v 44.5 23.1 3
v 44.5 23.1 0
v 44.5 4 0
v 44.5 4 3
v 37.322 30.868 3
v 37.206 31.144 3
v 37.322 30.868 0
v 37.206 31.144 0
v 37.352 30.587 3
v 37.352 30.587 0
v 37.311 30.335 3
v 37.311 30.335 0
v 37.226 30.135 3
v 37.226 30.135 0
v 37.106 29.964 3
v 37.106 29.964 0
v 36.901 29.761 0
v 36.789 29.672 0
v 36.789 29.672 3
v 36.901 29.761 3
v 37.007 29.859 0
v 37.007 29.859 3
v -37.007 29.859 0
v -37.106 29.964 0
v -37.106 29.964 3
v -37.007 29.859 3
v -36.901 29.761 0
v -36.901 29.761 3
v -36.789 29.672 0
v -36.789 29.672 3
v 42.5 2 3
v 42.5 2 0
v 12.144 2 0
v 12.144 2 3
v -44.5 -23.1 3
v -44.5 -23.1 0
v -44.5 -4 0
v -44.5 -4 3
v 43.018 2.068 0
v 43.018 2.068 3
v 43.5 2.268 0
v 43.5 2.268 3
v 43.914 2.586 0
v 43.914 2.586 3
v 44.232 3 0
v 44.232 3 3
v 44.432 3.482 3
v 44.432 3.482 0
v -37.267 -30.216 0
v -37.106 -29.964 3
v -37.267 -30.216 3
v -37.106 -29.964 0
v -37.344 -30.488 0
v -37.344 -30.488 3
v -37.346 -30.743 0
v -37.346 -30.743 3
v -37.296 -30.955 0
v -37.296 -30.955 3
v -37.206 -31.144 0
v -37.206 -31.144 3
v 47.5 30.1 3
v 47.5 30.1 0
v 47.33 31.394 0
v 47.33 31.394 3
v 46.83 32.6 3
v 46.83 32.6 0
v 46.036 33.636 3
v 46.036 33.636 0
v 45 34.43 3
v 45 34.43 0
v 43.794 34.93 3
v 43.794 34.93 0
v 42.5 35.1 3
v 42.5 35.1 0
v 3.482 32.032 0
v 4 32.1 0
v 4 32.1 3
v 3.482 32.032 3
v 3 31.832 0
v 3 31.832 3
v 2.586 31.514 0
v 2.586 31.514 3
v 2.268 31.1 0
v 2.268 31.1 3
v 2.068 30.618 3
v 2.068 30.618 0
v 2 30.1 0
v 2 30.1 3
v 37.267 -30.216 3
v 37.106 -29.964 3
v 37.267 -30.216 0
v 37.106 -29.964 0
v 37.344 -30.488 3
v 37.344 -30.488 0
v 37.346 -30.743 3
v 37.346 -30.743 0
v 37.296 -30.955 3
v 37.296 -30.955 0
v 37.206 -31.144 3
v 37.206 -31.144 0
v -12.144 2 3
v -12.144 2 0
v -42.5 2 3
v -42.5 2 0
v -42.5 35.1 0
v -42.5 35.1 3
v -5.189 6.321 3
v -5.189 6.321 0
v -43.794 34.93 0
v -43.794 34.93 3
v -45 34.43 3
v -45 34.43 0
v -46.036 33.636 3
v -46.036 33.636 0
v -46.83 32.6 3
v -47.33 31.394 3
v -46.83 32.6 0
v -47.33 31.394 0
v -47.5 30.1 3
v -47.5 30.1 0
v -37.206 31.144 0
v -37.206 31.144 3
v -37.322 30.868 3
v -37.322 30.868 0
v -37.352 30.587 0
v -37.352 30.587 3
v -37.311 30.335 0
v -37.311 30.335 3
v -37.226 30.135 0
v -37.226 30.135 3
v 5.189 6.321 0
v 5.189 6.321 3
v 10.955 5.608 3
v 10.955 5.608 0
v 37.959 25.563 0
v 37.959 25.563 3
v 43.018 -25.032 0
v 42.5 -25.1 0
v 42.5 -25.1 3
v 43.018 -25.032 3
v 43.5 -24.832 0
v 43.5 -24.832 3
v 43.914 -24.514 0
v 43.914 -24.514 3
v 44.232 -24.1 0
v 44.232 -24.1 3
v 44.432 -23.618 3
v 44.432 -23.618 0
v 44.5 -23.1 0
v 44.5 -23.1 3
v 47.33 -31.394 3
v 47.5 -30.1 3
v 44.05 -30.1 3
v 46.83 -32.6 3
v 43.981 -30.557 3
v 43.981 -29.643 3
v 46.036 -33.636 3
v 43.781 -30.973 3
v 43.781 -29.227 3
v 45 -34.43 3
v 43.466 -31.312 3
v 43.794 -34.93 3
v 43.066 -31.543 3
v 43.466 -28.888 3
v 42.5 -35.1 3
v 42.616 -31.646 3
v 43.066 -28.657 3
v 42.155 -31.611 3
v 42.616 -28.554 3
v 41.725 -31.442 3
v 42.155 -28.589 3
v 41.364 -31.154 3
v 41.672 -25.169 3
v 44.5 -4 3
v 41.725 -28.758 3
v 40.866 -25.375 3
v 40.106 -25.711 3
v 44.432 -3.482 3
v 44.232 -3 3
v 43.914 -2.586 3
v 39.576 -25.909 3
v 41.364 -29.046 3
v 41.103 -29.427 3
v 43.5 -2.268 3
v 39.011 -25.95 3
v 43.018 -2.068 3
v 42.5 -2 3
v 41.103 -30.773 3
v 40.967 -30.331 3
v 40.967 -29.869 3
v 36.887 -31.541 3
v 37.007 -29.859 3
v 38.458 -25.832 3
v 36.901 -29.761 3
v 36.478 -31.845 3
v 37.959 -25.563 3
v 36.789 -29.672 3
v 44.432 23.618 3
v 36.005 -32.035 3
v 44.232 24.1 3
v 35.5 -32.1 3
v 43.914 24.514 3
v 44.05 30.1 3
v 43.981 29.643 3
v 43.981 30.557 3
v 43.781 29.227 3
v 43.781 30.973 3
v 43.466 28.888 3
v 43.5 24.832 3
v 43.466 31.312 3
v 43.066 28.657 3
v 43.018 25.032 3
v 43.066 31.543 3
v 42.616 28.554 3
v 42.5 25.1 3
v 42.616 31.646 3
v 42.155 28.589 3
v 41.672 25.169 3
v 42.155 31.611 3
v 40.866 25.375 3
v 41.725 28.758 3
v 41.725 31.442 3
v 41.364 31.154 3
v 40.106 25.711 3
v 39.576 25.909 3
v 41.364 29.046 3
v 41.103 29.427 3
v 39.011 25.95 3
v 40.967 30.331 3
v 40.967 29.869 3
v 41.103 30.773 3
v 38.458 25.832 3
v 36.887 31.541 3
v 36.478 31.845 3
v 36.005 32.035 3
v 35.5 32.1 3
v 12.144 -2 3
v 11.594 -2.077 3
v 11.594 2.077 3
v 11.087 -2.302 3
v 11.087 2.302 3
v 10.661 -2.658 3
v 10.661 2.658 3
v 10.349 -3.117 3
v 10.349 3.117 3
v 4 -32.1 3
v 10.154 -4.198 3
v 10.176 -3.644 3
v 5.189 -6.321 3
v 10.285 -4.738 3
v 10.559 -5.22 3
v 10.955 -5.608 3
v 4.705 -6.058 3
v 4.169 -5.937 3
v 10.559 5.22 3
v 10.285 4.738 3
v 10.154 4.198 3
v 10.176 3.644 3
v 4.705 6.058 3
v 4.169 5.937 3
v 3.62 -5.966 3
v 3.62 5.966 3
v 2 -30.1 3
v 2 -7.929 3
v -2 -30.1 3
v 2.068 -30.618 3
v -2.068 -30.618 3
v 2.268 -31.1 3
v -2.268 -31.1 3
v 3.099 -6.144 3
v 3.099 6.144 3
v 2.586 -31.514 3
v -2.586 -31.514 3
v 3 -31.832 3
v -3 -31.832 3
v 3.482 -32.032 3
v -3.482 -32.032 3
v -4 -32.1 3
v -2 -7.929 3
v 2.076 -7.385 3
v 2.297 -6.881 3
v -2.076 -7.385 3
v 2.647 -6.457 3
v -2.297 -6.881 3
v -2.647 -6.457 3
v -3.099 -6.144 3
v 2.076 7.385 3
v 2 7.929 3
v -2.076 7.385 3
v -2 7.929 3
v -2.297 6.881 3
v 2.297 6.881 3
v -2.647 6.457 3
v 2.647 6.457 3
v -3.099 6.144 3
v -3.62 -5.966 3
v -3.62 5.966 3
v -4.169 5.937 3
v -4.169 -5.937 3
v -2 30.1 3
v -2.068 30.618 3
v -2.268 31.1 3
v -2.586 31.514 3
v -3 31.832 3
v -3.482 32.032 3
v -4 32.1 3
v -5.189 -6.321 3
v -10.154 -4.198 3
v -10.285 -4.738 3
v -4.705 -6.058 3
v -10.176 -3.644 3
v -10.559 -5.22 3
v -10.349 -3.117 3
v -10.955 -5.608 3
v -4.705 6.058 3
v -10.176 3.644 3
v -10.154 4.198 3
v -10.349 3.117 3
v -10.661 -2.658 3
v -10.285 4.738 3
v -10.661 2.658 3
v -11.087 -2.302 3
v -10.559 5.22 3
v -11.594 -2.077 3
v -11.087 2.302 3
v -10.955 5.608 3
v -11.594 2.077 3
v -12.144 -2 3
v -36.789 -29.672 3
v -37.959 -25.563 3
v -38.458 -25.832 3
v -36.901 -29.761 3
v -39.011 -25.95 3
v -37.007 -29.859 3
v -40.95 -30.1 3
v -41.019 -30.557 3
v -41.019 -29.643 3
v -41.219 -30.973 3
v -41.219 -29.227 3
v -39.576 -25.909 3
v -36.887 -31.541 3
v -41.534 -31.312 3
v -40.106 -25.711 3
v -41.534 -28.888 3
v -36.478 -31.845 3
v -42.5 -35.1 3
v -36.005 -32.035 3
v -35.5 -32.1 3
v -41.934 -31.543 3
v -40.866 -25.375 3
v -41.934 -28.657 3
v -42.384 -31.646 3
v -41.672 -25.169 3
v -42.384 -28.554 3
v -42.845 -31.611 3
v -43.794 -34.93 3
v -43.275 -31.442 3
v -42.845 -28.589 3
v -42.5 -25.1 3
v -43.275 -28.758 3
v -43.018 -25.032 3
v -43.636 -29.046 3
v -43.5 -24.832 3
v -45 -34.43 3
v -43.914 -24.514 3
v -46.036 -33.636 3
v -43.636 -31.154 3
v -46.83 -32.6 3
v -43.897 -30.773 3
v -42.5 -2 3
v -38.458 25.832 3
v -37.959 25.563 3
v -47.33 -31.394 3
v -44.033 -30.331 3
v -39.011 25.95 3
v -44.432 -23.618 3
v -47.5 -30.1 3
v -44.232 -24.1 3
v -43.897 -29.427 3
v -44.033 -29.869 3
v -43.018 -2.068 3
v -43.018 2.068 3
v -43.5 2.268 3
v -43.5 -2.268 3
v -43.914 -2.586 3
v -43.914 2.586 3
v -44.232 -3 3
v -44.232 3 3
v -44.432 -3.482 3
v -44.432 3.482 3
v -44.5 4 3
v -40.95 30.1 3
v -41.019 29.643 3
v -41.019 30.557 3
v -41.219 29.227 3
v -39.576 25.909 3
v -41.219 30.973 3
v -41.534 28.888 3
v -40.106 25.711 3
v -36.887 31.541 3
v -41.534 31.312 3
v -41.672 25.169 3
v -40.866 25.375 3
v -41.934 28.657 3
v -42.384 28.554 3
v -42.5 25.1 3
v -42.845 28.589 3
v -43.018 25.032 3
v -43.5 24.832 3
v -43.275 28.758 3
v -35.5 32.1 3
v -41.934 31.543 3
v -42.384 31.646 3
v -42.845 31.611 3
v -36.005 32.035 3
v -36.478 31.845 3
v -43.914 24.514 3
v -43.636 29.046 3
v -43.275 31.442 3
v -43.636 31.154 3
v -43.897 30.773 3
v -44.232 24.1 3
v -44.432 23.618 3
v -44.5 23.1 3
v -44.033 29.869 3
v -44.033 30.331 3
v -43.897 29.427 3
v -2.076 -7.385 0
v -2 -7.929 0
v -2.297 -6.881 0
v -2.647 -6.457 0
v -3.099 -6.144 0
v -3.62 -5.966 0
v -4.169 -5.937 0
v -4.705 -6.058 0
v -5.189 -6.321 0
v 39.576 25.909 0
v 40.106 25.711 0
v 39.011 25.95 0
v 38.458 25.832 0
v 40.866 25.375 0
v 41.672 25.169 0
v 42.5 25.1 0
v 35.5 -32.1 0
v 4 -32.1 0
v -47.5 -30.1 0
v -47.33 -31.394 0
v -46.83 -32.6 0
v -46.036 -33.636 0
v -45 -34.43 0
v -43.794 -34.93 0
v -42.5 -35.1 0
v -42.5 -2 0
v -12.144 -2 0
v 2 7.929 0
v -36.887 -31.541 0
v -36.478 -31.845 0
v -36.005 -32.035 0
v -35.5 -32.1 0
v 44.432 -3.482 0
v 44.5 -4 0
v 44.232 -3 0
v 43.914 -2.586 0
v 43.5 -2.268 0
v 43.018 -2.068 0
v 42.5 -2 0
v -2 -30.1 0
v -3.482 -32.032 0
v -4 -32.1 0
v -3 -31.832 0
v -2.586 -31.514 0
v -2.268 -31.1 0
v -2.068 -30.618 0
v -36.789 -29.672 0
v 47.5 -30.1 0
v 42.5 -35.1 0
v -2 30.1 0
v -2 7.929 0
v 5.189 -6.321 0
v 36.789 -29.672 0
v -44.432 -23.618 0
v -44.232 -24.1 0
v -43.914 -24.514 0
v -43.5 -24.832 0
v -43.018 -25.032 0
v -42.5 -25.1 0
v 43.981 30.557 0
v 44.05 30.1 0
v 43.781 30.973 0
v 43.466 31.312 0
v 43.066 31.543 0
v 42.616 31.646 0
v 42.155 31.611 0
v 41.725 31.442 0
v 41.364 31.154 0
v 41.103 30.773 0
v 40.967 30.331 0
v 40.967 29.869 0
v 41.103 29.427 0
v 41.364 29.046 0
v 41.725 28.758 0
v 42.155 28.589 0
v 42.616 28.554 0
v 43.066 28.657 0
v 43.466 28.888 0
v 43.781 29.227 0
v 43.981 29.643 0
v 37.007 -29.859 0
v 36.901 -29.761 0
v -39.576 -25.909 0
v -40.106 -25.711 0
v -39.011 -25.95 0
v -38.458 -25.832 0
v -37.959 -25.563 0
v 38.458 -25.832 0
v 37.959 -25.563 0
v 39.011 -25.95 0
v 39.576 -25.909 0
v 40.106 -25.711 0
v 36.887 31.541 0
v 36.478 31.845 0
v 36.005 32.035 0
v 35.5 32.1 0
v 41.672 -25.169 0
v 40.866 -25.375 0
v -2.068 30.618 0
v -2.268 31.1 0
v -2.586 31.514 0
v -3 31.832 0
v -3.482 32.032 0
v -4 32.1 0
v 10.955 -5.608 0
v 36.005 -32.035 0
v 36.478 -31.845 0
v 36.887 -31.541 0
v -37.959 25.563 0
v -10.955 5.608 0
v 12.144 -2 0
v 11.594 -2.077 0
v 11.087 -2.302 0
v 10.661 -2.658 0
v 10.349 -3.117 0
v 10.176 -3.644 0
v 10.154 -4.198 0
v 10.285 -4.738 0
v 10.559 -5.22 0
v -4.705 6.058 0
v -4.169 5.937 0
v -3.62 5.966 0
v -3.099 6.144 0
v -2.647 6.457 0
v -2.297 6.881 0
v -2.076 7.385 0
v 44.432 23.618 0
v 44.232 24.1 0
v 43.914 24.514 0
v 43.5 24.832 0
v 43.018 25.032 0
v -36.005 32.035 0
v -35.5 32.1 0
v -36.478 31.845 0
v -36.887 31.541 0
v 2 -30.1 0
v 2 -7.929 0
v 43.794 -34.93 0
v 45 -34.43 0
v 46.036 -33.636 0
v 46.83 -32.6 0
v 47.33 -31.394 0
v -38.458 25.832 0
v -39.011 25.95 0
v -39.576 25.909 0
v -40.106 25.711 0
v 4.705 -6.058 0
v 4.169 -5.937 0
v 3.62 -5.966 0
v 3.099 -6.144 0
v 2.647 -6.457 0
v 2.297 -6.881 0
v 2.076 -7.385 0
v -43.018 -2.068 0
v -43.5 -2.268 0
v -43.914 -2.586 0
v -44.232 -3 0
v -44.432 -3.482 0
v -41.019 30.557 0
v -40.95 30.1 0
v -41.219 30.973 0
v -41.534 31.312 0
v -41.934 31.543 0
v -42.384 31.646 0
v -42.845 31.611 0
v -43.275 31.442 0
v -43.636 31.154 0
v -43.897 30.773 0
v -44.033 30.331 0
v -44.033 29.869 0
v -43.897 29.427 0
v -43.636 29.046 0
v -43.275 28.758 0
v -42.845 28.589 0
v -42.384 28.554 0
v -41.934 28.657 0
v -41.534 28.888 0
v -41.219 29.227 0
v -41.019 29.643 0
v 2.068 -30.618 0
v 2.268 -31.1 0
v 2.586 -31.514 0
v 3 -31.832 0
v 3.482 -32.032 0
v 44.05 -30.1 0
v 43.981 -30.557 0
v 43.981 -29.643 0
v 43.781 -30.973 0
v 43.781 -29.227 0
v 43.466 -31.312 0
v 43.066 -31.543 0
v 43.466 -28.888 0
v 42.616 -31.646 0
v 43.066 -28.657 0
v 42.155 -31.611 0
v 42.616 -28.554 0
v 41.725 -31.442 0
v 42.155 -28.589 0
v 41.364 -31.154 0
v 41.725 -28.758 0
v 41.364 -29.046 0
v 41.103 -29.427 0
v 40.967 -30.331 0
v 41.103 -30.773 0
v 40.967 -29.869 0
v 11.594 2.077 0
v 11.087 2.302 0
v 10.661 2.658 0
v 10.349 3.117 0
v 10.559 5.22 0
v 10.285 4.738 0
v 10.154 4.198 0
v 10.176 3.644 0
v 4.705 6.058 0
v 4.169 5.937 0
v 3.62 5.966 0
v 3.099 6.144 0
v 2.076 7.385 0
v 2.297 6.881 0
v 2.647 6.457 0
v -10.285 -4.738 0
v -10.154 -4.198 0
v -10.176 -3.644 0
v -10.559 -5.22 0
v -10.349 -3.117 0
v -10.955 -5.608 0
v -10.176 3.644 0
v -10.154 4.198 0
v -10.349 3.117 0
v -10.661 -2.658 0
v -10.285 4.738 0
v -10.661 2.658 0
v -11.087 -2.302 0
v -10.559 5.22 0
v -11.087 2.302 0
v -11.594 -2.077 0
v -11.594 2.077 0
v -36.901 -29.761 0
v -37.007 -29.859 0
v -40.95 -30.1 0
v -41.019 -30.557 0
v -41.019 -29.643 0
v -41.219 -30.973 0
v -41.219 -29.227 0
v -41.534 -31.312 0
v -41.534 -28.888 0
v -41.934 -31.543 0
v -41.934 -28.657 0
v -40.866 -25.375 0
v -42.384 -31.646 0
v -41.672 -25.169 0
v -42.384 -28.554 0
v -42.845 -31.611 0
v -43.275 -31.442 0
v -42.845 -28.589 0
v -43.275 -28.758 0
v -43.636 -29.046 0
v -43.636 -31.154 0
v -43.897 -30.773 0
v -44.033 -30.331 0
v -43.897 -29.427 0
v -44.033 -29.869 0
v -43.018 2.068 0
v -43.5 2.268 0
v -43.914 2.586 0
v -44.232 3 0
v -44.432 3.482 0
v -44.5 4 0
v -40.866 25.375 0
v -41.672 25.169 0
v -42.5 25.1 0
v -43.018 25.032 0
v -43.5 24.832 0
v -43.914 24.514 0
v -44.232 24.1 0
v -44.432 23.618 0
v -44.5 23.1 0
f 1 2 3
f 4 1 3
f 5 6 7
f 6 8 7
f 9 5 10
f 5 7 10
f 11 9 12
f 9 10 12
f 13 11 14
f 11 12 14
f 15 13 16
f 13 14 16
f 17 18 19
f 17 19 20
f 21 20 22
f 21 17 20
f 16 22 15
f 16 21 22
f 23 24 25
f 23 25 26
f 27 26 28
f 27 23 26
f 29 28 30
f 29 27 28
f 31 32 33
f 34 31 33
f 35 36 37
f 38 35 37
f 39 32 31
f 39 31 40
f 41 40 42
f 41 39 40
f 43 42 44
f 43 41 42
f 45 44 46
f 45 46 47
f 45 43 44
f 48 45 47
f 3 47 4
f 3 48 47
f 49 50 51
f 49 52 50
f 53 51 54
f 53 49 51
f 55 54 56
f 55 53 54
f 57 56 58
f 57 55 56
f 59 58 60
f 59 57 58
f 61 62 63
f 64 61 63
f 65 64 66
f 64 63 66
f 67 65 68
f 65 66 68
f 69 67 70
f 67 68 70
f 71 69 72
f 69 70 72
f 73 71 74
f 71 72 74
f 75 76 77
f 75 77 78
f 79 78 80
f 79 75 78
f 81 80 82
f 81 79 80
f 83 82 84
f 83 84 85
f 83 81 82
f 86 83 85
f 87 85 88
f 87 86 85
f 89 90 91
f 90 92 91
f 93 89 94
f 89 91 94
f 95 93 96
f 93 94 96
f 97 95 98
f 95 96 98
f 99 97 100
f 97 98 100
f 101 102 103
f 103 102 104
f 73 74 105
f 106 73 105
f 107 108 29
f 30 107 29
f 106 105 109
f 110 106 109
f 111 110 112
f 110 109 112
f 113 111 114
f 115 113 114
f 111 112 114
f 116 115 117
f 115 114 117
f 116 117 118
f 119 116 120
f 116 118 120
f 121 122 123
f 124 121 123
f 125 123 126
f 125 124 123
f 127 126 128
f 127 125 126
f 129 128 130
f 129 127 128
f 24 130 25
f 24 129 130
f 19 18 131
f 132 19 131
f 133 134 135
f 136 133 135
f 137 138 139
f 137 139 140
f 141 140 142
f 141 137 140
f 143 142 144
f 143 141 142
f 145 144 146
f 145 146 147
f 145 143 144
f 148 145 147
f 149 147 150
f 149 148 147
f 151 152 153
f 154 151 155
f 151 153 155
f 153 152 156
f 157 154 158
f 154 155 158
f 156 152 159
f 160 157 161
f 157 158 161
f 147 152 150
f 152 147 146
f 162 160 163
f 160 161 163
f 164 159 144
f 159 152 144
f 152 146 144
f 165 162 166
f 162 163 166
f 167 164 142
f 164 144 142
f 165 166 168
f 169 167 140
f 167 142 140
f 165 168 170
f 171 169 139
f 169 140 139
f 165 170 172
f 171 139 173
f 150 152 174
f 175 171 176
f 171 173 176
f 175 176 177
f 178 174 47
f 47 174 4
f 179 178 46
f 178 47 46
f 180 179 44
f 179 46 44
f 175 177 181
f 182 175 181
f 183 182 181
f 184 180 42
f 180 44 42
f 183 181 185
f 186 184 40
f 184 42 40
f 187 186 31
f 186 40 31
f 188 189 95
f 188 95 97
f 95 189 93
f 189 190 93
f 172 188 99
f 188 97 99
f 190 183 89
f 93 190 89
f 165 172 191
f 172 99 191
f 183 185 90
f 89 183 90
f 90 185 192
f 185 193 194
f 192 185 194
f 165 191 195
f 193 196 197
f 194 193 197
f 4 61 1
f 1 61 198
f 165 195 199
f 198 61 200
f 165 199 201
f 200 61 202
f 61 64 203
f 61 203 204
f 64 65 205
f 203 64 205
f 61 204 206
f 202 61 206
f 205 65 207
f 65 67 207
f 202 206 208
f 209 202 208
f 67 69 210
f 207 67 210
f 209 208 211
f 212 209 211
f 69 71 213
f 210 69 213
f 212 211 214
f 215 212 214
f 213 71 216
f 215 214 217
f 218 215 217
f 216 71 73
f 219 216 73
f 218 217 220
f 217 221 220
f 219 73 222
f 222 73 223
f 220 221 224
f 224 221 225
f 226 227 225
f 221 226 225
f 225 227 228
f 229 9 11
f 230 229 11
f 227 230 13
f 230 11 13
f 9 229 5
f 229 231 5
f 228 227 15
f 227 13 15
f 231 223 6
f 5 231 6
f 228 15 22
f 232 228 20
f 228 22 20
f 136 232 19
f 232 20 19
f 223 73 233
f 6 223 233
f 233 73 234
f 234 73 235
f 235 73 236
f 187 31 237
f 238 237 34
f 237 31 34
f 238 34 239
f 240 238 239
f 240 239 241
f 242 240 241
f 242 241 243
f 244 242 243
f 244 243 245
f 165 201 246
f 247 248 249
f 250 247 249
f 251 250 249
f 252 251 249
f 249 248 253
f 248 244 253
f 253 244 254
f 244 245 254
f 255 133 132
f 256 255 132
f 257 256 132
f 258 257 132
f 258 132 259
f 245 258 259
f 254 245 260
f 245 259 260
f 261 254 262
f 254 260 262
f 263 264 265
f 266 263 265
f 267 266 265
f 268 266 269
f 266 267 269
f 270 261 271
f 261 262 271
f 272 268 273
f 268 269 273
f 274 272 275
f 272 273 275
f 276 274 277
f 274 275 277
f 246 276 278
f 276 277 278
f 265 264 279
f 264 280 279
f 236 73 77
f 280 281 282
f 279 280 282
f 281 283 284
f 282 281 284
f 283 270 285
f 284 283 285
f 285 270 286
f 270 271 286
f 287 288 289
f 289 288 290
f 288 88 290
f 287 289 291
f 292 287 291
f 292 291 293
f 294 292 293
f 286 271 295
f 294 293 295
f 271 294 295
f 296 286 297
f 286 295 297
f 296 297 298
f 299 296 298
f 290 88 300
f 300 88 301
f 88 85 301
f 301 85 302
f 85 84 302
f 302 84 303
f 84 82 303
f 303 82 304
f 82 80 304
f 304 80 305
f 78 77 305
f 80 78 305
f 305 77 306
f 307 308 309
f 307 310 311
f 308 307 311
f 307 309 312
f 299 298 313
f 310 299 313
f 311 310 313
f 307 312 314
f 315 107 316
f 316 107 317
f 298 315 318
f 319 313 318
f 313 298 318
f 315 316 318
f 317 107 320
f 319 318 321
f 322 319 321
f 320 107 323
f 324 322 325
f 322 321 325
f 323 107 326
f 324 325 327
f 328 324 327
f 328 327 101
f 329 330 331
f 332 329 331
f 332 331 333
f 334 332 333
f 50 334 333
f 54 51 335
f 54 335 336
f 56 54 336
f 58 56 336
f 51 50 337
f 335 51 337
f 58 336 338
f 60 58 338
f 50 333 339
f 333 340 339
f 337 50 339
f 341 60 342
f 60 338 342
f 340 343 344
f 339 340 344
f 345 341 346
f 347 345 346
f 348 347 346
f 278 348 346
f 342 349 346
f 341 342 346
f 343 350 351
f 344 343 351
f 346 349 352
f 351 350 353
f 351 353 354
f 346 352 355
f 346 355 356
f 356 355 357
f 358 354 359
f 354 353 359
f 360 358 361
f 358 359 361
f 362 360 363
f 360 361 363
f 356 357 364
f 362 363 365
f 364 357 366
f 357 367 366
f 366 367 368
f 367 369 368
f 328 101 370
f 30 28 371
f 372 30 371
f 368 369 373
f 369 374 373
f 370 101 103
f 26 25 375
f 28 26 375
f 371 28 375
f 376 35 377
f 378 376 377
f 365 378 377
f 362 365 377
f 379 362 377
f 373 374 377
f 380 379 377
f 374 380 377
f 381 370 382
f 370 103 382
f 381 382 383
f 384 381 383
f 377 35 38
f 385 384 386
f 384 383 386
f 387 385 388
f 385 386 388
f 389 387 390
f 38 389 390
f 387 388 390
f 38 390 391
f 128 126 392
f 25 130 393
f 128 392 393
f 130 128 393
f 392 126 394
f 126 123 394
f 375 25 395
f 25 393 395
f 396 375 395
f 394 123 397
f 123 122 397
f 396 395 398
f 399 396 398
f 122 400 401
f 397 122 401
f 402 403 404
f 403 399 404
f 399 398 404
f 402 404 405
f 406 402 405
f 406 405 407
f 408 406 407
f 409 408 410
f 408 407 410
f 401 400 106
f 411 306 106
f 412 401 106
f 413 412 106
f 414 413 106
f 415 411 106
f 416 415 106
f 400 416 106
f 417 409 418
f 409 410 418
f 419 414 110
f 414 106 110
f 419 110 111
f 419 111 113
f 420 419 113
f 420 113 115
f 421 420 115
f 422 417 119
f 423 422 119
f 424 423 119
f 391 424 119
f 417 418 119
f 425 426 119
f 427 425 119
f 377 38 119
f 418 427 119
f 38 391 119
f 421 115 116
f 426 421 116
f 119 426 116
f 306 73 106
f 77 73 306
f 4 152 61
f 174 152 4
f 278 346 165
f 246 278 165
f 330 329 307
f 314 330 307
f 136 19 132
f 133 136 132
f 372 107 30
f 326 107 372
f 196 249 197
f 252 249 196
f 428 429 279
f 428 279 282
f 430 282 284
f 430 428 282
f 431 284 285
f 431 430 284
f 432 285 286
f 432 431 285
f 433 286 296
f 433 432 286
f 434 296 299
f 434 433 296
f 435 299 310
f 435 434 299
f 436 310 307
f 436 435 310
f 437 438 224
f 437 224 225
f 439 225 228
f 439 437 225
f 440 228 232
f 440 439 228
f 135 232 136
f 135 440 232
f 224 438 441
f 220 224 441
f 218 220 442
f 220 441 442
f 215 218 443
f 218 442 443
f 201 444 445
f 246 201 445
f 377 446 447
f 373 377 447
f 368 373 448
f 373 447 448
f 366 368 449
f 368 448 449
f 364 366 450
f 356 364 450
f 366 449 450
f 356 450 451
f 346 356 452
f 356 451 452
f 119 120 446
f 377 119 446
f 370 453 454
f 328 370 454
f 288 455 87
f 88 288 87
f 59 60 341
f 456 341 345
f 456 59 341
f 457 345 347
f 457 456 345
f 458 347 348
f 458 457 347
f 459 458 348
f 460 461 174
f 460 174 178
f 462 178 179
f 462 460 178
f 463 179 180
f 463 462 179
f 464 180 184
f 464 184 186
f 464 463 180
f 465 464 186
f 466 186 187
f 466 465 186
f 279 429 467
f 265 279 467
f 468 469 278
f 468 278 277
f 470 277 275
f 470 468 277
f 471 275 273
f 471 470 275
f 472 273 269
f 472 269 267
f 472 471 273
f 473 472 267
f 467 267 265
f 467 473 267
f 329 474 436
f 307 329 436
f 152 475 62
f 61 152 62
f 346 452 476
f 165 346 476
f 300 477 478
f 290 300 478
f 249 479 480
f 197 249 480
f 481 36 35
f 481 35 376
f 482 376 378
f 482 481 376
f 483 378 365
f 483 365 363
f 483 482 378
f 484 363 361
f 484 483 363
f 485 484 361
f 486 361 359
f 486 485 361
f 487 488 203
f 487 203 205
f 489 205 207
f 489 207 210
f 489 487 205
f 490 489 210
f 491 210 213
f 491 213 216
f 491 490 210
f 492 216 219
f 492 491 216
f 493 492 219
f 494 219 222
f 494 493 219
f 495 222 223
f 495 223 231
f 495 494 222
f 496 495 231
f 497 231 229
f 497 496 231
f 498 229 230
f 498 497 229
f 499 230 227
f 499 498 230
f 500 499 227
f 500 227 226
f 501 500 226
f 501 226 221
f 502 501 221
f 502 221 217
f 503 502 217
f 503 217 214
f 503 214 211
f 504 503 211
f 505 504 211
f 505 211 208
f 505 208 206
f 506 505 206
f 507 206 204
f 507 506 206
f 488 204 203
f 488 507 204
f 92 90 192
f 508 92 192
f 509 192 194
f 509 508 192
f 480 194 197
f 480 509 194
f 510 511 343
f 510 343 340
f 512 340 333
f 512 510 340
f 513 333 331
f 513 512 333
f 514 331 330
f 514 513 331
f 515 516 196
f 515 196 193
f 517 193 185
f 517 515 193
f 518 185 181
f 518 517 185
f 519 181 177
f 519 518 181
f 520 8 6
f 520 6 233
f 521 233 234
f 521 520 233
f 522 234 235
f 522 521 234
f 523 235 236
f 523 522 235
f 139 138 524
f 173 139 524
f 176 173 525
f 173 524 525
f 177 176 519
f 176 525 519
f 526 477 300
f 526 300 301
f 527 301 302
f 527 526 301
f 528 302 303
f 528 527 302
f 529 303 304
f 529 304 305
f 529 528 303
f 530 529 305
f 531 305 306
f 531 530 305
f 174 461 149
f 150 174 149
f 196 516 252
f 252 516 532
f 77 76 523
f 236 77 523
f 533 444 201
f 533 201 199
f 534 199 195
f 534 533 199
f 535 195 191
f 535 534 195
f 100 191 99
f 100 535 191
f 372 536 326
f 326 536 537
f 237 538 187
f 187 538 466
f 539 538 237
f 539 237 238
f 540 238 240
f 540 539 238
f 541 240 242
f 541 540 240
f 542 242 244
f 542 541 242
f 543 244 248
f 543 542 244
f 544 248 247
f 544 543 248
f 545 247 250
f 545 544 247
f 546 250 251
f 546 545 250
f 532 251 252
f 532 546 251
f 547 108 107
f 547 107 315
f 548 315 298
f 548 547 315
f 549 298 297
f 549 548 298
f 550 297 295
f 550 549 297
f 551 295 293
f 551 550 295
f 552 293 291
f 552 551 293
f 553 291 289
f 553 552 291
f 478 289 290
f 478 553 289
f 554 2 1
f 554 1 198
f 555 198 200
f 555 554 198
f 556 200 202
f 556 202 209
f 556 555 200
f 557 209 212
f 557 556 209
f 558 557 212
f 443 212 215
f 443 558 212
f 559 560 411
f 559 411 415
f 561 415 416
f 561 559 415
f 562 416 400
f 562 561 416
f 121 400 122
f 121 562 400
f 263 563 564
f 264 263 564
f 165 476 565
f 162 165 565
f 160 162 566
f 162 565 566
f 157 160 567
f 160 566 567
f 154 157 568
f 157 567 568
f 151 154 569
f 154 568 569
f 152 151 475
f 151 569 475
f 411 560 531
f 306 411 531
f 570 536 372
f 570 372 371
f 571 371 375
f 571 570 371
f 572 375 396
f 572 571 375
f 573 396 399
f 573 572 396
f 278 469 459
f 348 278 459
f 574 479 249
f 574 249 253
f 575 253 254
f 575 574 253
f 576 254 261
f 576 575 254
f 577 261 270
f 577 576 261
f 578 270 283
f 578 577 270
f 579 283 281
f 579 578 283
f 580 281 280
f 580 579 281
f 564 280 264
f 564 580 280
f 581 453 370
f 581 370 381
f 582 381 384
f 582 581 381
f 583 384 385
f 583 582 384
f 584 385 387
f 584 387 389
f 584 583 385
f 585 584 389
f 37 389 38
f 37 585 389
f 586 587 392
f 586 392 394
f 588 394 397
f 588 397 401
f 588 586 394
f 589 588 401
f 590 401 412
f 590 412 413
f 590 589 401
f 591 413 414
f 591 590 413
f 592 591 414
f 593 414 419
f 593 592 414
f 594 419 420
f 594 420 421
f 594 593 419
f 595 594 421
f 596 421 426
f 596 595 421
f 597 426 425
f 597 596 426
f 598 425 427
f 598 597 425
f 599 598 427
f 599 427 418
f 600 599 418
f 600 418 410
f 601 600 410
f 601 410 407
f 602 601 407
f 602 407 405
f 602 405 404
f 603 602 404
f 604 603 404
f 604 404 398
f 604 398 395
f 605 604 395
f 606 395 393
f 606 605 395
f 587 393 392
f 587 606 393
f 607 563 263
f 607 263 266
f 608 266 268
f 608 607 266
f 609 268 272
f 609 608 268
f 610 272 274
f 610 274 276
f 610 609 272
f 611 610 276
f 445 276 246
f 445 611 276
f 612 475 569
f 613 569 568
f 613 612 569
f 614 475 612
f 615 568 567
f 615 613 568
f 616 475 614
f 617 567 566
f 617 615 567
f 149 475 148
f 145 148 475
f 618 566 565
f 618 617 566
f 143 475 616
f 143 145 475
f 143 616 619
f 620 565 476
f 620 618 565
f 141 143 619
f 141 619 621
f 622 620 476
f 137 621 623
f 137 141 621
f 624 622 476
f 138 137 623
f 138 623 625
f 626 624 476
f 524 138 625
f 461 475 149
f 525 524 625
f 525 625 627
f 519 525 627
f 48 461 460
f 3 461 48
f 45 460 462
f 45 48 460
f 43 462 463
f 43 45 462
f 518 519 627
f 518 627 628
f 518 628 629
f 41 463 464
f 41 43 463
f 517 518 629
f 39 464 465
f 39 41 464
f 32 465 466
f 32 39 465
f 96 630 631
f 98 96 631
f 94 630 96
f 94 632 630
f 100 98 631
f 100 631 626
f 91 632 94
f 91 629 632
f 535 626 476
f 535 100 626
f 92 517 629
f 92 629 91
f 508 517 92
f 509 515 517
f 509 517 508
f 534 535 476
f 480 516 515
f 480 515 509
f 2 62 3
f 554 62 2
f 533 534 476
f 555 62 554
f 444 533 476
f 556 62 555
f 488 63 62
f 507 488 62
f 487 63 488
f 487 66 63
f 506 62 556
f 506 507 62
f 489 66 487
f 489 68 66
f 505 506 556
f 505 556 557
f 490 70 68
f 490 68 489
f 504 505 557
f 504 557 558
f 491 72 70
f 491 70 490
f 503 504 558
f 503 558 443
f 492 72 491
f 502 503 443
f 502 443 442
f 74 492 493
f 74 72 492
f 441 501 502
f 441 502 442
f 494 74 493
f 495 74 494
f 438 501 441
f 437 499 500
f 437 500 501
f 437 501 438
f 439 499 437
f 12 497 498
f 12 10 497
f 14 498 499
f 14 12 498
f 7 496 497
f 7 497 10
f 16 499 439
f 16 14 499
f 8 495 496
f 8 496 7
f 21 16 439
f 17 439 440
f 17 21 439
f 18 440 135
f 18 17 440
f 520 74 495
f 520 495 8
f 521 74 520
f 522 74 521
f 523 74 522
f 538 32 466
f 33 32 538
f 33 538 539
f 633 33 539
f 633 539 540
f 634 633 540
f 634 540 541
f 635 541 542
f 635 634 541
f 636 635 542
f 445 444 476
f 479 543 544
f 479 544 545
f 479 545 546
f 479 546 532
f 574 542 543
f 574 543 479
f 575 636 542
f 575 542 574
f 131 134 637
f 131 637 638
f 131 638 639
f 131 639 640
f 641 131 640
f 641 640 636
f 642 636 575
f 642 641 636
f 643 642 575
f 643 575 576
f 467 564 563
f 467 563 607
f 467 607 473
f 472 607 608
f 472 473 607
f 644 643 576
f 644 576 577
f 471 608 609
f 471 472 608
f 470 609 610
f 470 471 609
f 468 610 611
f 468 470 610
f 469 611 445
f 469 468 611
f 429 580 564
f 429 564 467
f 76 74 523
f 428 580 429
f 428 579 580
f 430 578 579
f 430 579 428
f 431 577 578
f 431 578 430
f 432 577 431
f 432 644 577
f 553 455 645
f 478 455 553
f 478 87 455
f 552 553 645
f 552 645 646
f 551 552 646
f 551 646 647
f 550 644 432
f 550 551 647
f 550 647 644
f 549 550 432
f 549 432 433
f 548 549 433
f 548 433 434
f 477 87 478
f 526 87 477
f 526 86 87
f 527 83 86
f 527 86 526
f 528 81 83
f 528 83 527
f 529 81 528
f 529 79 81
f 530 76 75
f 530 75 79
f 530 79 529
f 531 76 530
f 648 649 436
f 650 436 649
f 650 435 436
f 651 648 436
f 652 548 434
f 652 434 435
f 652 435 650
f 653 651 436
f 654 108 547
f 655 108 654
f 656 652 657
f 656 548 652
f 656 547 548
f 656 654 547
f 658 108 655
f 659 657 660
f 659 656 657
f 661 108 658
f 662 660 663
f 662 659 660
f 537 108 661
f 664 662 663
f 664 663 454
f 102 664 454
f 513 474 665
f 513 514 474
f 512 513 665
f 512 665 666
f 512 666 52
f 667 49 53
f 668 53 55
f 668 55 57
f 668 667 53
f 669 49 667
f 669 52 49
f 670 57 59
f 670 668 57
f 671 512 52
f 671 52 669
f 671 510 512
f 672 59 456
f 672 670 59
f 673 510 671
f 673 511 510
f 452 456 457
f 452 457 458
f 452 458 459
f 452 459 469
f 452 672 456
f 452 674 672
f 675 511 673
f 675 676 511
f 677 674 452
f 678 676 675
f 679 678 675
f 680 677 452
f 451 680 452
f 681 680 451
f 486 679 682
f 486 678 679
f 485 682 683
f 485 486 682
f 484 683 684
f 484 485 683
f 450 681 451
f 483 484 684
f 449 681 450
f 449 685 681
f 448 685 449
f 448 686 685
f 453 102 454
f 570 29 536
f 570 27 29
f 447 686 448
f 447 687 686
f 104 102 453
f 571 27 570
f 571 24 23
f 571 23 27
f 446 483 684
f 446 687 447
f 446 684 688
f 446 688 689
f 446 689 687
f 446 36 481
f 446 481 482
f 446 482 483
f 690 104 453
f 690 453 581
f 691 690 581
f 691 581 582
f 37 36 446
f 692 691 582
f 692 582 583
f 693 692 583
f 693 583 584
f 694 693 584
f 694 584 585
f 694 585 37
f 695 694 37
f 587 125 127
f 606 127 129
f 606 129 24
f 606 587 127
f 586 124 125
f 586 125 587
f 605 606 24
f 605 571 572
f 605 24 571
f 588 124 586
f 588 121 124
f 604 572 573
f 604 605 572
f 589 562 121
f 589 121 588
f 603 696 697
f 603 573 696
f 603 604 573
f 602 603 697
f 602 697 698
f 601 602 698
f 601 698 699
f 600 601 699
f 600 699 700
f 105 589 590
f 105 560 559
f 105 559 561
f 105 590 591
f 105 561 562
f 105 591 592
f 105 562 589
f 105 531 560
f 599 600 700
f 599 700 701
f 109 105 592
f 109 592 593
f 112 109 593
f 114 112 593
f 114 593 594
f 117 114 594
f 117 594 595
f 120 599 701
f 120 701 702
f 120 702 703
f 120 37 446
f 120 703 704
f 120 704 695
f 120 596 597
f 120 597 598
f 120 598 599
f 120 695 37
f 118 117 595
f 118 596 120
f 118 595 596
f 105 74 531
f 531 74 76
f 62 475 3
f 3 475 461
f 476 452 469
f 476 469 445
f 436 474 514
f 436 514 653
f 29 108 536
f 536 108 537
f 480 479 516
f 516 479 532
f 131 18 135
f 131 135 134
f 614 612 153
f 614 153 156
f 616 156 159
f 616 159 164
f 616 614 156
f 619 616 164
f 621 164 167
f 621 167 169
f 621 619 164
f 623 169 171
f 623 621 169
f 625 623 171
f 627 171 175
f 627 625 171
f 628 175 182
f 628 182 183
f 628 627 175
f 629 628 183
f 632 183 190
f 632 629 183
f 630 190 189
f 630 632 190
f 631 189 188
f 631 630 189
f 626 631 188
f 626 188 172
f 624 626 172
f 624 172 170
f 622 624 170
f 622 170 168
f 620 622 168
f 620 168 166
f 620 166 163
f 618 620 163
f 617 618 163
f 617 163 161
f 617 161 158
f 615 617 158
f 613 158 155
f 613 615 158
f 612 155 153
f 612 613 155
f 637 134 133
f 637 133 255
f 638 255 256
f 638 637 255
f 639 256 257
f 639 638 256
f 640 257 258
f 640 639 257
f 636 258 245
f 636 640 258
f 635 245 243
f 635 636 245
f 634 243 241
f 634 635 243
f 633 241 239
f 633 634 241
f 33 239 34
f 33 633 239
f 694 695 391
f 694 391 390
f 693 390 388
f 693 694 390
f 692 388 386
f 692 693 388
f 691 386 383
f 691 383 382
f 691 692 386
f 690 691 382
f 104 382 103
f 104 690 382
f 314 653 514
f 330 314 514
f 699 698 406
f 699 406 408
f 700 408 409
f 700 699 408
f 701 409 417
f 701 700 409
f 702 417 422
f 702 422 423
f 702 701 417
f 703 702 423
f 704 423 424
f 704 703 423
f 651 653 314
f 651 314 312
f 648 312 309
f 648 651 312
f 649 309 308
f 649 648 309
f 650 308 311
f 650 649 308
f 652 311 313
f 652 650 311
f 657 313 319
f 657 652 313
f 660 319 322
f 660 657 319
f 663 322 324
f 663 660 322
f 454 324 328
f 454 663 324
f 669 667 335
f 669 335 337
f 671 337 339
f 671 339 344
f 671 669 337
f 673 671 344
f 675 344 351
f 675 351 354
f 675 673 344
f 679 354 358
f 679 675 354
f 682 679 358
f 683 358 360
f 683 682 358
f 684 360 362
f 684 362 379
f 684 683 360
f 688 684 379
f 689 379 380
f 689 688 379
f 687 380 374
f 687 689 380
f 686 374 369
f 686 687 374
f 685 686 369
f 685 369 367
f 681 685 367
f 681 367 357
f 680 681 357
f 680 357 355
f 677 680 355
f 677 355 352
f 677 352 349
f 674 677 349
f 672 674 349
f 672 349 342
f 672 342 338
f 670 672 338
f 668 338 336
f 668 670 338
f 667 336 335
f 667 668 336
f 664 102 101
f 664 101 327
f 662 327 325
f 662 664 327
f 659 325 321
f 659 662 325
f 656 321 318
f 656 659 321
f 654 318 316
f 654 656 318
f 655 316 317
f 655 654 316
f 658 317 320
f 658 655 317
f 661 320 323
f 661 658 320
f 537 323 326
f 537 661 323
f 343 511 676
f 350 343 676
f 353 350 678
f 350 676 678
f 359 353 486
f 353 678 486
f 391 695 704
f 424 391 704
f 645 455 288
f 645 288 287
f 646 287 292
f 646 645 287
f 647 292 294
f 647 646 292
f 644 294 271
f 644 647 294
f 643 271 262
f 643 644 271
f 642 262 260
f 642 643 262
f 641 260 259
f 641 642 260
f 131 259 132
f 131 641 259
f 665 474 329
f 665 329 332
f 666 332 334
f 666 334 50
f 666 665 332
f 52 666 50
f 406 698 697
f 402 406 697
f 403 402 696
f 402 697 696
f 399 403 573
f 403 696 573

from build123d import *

# Parameters (mm, degrees)
SKETCH_1_R      = 5
SKETCH_1_R_2    = 1.55
EXTRUDE_1_DEPTH = 3
FILLET_1_R      = 2
FILLET_2_R      = 1


with BuildPart() as part:
    # 草图1 → 凸台-拉伸1 (new body)
    # profile 1 of 5: a face of its own
    with BuildSketch(Plane.XY):
        with BuildLine():
            Line((-42.5, -35.1), (42.5, -35.1))
            ThreePointArc((42.5, -35.1), (39.761387212, -34.283300133), (37.917424305, -32.1))
            Line((37.917424305, -32.1), (2, -32.1))
            Line((2, -32.1), (2, -3.964694458))
            Line((2, -3.964694458), (37.500961204, -30.198036316))
            ThreePointArc((37.500961204, -30.198036316), (37.902514018, -28.134517198), (39.116783888, -26.418444794))
            Line((39.116783888, -26.418444794), (6.071879965, -2))
            Line((6.071879965, -2), (44.5, -2))
            Line((44.5, -2), (44.5, -25.517424305))
            ThreePointArc((44.5, -25.517424305), (46.683300133, -27.361387212), (47.5, -30.1))
            Line((47.5, -30.1), (47.5, 30.1))
            ThreePointArc((47.5, 30.1), (46.683300133, 27.361387212), (44.5, 25.517424305))
            Line((44.5, 25.517424305), (44.5, 2))
            Line((44.5, 2), (6.071879965, 2))
            Line((6.071879965, 2), (39.116783888, 26.418444794))
            ThreePointArc((39.116783888, 26.418444794), (37.902514018, 28.134517198), (37.500961204, 30.198036316))
            Line((37.500961204, 30.198036316), (2, 3.964694458))
            Line((2, 3.964694458), (2, 32.1))
            Line((2, 32.1), (37.917424305, 32.1))
            ThreePointArc((37.917424305, 32.1), (39.761387212, 34.283300133), (42.5, 35.1))
            Line((42.5, 35.1), (-42.5, 35.1))
            ThreePointArc((-42.5, 35.1), (-39.761387212, 34.283300133), (-37.917424305, 32.1))
            Line((-37.917424305, 32.1), (-2, 32.1))
            Line((-2, 32.1), (-2, 3.964694458))
            Line((-2, 3.964694458), (-37.500961204, 30.198036316))
            ThreePointArc((-37.500961204, 30.198036316), (-37.500240307, 30.149020514), (-37.5, 30.1))
            ThreePointArc((-37.5, 30.1), (-37.922004775, 28.089537437), (-39.116783888, 26.418444794))
            Line((-39.116783888, 26.418444794), (-6.071879965, 2))
            Line((-6.071879965, 2), (-44.5, 2))
            Line((-44.5, 2), (-44.5, 25.517424305))
            ThreePointArc((-44.5, 25.517424305), (-46.683300133, 27.361387212), (-47.5, 30.1))
            Line((-47.5, 30.1), (-47.5, -30.1))
            ThreePointArc((-47.5, -30.1), (-46.683300133, -27.361387212), (-44.5, -25.517424305))
            Line((-44.5, -25.517424305), (-44.5, -2))
            Line((-44.5, -2), (-6.071879965, -2))
            Line((-6.071879965, -2), (-39.116783888, -26.418444794))
            ThreePointArc((-39.116783888, -26.418444794), (-37.922004775, -28.089537437), (-37.5, -30.1))
            ThreePointArc((-37.5, -30.1), (-37.500240307, -30.149020514), (-37.500961204, -30.198036316))
            Line((-37.500961204, -30.198036316), (-2, -3.964694458))
            Line((-2, -3.964694458), (-2, -32.1))
            Line((-2, -32.1), (-37.917424305, -32.1))
            ThreePointArc((-37.917424305, -32.1), (-39.761387212, -34.283300133), (-42.5, -35.1))
        make_face()
    # profile 2 of 5: a face of its own
    with BuildSketch(Plane.XY):
        with Locations((-42.5, 30.1)):
            Circle(SKETCH_1_R)
        with Locations((-42.5, 30.1)):
            Circle(SKETCH_1_R_2, mode=Mode.SUBTRACT)
    # profile 3 of 5: a face of its own
    with BuildSketch(Plane.XY):
        with Locations((42.5, 30.1)):
            Circle(SKETCH_1_R)
        with Locations((42.5, 30.1)):
            Circle(SKETCH_1_R_2, mode=Mode.SUBTRACT)
    # profile 4 of 5: a face of its own
    with BuildSketch(Plane.XY):
        with Locations((42.5, -30.1)):
            Circle(SKETCH_1_R)
        with Locations((42.5, -30.1)):
            Circle(SKETCH_1_R_2, mode=Mode.SUBTRACT)
    # profile 5 of 5: a face of its own
    with BuildSketch(Plane.XY):
        with Locations((-42.5, -30.1)):
            Circle(SKETCH_1_R)
        with Locations((-42.5, -30.1)):
            Circle(SKETCH_1_R_2, mode=Mode.SUBTRACT)
    extrude(amount=EXTRUDE_1_DEPTH)

    # 圆角1
    # the kernel refuses this fillet: 2 mm, written as the material it adds along each edge
    with BuildSketch(Plane(origin=(39.116783888, 26.418444794, 0), x_dir=(-0.8042465112804378, -0.5942958430724927, 0), z_dir=(0, 0, 1)), Plane(origin=(-39.116783888, -26.418444794, 0), x_dir=(0.8042465112804382, 0.5942958430724918, 0), z_dir=(0, 0, 1))) as fillet_1_piece_1:
        with BuildLine():
            CenterArc((1.439043849, 2), FILLET_1_R, 204.927038376, 65.072961624)
            ThreePointArc((-0.374646596, 1.157072383), (-0.152011037, 0.589969891), (0, 0))
            Line((0, 0), (1.439043849, 0))
        make_face()
    extrude(amount=3)
    with BuildSketch(Plane(origin=(6.071879965, 2, 0), x_dir=(1, 0, 0), z_dir=(0, 0, 1)), Plane(origin=(6.071879965, -2, 0), x_dir=(0.804246511280438, -0.5942958430724921, 0), z_dir=(0, 0, 1)), Plane(origin=(-6.071879965, -2, 0), x_dir=(-1, 0, 0), z_dir=(0, 0, 1)), Plane(origin=(-6.071879965, 2, 0), x_dir=(-0.8042465112804379, 0.5942958430724924, 0), z_dir=(0, 0, 1))) as fillet_1_piece_2:
        with BuildLine():
            CenterArc((FILLET_1_R * 3.03593998227, FILLET_1_R), FILLET_1_R, 126.462450613, 143.537549387)
            Line((FILLET_1_R * 2.4416441392, FILLET_1_R * 1.80424651128), (0, 0))
            Line((0, 0), (FILLET_1_R * 3.03593998227, 0))
        make_face()
    extrude(amount=3)
    with BuildSketch(Plane(origin=(44.5, 2, 0), x_dir=(0, 1, 0), z_dir=(0, 0, 1)), Plane(origin=(44.5, -2, 0), x_dir=(-1, 0, 0), z_dir=(0, 0, 1)), Plane(origin=(2, -32.1, 0), x_dir=(1, 0, 0), z_dir=(0, 0, 1)), Plane(origin=(-2, -32.1, 0), x_dir=(0, 1, 0), z_dir=(0, 0, 1)), Plane(origin=(-44.5, -2, 0), x_dir=(0, -1, 0), z_dir=(0, 0, 1)), Plane(origin=(-44.5, 2, 0), x_dir=(1, 0, 0), z_dir=(0, 0, 1)), Plane(origin=(-2, 32.1, 0), x_dir=(-1, 0, 0), z_dir=(0, 0, 1)), Plane(origin=(2, 32.1, 0), x_dir=(0, -1, 0), z_dir=(0, 0, 1))) as fillet_1_piece_3:
        with BuildLine():
            CenterArc((FILLET_1_R, FILLET_1_R), FILLET_1_R, 180, 90)
            Line((0, FILLET_1_R), (0, 0))
            Line((0, 0), (FILLET_1_R, 0))
        make_face()
    extrude(amount=3)
    with BuildSketch(Plane(origin=(44.5, 25.517424305, 0), x_dir=(0, -1, 0), z_dir=(0, 0, 1)), Plane(origin=(37.917424305, -32.1, 0), x_dir=(-1, 0, 0), z_dir=(0, 0, 1)), Plane(origin=(-44.5, -25.517424305, 0), x_dir=(0, 1, 0), z_dir=(0, 0, 1)), Plane(origin=(-37.917424305, 32.1, 0), x_dir=(1, 0, 0), z_dir=(0, 0, 1))) as fillet_1_piece_4:
        with BuildLine():
            CenterArc((2.417424305, -2), FILLET_1_R, 90, 90)
            ThreePointArc((0.417424305, -2), (0.31195587, -0.978451782), (0, 0))
            Line((0, 0), (2.417424305, 0))
        make_face()
    extrude(amount=3)
    with BuildSketch(Plane(origin=(44.5, -25.517424305, 0), x_dir=(0, 1, 0), z_dir=(0, 0, 1)), Plane(origin=(-37.917424305, -32.1, 0), x_dir=(1, 0, 0), z_dir=(0, 0, 1)), Plane(origin=(-44.5, 25.517424305, 0), x_dir=(0, -1, 0), z_dir=(0, 0, 1)), Plane(origin=(37.917424305, 32.1, 0), x_dir=(-1, 0, 0), z_dir=(0, 0, 1))) as fillet_1_piece_5:
        with BuildLine():
            CenterArc((2.417424305, 2), FILLET_1_R, 180, 90)
            ThreePointArc((0.417424305, 2), (0.31195587, 0.978451782), (0, 0))
            Line((0, 0), (2.417424305, 0))
        make_face()
    extrude(amount=3)
    with BuildSketch(Plane(origin=(39.116783888, -26.418444794, 0), x_dir=(-0.8042465112804377, 0.5942958430724928, 0), z_dir=(0, 0, 1)), Plane(origin=(-39.116783888, 26.418444794, 0), x_dir=(0.8042465112804396, -0.5942958430724902, 0), z_dir=(0, 0, 1))) as fillet_1_piece_6:
        with BuildLine():
            CenterArc((1.439043849, -2), FILLET_1_R, 90, 65.072961624)
            ThreePointArc((-0.374646596, -1.157072383), (-0.152011037, -0.589969891), (0, 0))
            Line((0, 0), (1.439043849, 0))
        make_face()
    extrude(amount=3)
    with BuildSketch(Plane(origin=(2, -3.964694458, 0), x_dir=(0, -1, 0), z_dir=(0, 0, 1)), Plane(origin=(-2, -3.964694458, 0), x_dir=(-0.8042465112804379, -0.5942958430724925, 0), z_dir=(0, 0, 1)), Plane(origin=(-2, 3.964694458, 0), x_dir=(0, 1, 0), z_dir=(0, 0, 1)), Plane(origin=(2, 3.964694458, 0), x_dir=(0.804246511280438, 0.5942958430724923, 0), z_dir=(0, 0, 1))) as fillet_1_piece_7:
        with BuildLine():
            CenterArc((FILLET_1_R * 1.982347229, FILLET_1_R), FILLET_1_R, 143.537549387, 126.462450613)
            Line((FILLET_1_R * 1.17810071772, FILLET_1_R * 1.59429584307), (0, 0))
            Line((0, 0), (FILLET_1_R * 1.982347229, 0))
        make_face()
    extrude(amount=3)
    with BuildSketch(Plane(origin=(37.500961204, -30.198036316, 0), x_dir=(-0.8042465112804396, 0.5942958430724902, 0), z_dir=(0, 0, 1)), Plane(origin=(-37.500961204, 30.198036316, 0), x_dir=(0.8042465112804383, -0.5942958430724916, 0), z_dir=(0, 0, 1))) as fillet_1_piece_8:
        with BuildLine():
            CenterArc((0.885482013, 2), FILLET_1_R, 226.169636842, 43.830363158)
            ThreePointArc((-0.499569115, 0.557213331), (-0.239344892, 0.287966338), (0, 0))
            Line((0, 0), (0.885482013, 0))
        make_face()
    extrude(amount=3)
    with BuildSketch(Plane(origin=(-37.500961204, -30.198036316, 0), x_dir=(0.8042465112804397, 0.59429584307249, 0), z_dir=(0, 0, 1)), Plane(origin=(37.500961204, 30.198036316, 0), x_dir=(-0.8042465112804407, -0.5942958430724886, 0), z_dir=(0, 0, 1))) as fillet_1_piece_9:
        with BuildLine():
            CenterArc((0.885482013, -2), FILLET_1_R, 90, 43.830363158)
            ThreePointArc((-0.499569115, -0.557213331), (-0.239344892, -0.287966338), (0, 0))
            Line((0, 0), (0.885482013, 0))
        make_face()
    extrude(amount=3)

    # 圆角2
    fillet_2_edges = [part.edges().sort_by_distance(p)[0] for p in [
        (37.453554234, -30.528515876, 1.5),
        (-37.453554234, -30.528515876, 1.5),
        (-37.453554234, 30.528515876, 1.5),
        (37.453554234, 30.528515876, 1.5),
    ]]
    fillet(fillet_2_edges, radius=FILLET_2_R)


solid = part.part
